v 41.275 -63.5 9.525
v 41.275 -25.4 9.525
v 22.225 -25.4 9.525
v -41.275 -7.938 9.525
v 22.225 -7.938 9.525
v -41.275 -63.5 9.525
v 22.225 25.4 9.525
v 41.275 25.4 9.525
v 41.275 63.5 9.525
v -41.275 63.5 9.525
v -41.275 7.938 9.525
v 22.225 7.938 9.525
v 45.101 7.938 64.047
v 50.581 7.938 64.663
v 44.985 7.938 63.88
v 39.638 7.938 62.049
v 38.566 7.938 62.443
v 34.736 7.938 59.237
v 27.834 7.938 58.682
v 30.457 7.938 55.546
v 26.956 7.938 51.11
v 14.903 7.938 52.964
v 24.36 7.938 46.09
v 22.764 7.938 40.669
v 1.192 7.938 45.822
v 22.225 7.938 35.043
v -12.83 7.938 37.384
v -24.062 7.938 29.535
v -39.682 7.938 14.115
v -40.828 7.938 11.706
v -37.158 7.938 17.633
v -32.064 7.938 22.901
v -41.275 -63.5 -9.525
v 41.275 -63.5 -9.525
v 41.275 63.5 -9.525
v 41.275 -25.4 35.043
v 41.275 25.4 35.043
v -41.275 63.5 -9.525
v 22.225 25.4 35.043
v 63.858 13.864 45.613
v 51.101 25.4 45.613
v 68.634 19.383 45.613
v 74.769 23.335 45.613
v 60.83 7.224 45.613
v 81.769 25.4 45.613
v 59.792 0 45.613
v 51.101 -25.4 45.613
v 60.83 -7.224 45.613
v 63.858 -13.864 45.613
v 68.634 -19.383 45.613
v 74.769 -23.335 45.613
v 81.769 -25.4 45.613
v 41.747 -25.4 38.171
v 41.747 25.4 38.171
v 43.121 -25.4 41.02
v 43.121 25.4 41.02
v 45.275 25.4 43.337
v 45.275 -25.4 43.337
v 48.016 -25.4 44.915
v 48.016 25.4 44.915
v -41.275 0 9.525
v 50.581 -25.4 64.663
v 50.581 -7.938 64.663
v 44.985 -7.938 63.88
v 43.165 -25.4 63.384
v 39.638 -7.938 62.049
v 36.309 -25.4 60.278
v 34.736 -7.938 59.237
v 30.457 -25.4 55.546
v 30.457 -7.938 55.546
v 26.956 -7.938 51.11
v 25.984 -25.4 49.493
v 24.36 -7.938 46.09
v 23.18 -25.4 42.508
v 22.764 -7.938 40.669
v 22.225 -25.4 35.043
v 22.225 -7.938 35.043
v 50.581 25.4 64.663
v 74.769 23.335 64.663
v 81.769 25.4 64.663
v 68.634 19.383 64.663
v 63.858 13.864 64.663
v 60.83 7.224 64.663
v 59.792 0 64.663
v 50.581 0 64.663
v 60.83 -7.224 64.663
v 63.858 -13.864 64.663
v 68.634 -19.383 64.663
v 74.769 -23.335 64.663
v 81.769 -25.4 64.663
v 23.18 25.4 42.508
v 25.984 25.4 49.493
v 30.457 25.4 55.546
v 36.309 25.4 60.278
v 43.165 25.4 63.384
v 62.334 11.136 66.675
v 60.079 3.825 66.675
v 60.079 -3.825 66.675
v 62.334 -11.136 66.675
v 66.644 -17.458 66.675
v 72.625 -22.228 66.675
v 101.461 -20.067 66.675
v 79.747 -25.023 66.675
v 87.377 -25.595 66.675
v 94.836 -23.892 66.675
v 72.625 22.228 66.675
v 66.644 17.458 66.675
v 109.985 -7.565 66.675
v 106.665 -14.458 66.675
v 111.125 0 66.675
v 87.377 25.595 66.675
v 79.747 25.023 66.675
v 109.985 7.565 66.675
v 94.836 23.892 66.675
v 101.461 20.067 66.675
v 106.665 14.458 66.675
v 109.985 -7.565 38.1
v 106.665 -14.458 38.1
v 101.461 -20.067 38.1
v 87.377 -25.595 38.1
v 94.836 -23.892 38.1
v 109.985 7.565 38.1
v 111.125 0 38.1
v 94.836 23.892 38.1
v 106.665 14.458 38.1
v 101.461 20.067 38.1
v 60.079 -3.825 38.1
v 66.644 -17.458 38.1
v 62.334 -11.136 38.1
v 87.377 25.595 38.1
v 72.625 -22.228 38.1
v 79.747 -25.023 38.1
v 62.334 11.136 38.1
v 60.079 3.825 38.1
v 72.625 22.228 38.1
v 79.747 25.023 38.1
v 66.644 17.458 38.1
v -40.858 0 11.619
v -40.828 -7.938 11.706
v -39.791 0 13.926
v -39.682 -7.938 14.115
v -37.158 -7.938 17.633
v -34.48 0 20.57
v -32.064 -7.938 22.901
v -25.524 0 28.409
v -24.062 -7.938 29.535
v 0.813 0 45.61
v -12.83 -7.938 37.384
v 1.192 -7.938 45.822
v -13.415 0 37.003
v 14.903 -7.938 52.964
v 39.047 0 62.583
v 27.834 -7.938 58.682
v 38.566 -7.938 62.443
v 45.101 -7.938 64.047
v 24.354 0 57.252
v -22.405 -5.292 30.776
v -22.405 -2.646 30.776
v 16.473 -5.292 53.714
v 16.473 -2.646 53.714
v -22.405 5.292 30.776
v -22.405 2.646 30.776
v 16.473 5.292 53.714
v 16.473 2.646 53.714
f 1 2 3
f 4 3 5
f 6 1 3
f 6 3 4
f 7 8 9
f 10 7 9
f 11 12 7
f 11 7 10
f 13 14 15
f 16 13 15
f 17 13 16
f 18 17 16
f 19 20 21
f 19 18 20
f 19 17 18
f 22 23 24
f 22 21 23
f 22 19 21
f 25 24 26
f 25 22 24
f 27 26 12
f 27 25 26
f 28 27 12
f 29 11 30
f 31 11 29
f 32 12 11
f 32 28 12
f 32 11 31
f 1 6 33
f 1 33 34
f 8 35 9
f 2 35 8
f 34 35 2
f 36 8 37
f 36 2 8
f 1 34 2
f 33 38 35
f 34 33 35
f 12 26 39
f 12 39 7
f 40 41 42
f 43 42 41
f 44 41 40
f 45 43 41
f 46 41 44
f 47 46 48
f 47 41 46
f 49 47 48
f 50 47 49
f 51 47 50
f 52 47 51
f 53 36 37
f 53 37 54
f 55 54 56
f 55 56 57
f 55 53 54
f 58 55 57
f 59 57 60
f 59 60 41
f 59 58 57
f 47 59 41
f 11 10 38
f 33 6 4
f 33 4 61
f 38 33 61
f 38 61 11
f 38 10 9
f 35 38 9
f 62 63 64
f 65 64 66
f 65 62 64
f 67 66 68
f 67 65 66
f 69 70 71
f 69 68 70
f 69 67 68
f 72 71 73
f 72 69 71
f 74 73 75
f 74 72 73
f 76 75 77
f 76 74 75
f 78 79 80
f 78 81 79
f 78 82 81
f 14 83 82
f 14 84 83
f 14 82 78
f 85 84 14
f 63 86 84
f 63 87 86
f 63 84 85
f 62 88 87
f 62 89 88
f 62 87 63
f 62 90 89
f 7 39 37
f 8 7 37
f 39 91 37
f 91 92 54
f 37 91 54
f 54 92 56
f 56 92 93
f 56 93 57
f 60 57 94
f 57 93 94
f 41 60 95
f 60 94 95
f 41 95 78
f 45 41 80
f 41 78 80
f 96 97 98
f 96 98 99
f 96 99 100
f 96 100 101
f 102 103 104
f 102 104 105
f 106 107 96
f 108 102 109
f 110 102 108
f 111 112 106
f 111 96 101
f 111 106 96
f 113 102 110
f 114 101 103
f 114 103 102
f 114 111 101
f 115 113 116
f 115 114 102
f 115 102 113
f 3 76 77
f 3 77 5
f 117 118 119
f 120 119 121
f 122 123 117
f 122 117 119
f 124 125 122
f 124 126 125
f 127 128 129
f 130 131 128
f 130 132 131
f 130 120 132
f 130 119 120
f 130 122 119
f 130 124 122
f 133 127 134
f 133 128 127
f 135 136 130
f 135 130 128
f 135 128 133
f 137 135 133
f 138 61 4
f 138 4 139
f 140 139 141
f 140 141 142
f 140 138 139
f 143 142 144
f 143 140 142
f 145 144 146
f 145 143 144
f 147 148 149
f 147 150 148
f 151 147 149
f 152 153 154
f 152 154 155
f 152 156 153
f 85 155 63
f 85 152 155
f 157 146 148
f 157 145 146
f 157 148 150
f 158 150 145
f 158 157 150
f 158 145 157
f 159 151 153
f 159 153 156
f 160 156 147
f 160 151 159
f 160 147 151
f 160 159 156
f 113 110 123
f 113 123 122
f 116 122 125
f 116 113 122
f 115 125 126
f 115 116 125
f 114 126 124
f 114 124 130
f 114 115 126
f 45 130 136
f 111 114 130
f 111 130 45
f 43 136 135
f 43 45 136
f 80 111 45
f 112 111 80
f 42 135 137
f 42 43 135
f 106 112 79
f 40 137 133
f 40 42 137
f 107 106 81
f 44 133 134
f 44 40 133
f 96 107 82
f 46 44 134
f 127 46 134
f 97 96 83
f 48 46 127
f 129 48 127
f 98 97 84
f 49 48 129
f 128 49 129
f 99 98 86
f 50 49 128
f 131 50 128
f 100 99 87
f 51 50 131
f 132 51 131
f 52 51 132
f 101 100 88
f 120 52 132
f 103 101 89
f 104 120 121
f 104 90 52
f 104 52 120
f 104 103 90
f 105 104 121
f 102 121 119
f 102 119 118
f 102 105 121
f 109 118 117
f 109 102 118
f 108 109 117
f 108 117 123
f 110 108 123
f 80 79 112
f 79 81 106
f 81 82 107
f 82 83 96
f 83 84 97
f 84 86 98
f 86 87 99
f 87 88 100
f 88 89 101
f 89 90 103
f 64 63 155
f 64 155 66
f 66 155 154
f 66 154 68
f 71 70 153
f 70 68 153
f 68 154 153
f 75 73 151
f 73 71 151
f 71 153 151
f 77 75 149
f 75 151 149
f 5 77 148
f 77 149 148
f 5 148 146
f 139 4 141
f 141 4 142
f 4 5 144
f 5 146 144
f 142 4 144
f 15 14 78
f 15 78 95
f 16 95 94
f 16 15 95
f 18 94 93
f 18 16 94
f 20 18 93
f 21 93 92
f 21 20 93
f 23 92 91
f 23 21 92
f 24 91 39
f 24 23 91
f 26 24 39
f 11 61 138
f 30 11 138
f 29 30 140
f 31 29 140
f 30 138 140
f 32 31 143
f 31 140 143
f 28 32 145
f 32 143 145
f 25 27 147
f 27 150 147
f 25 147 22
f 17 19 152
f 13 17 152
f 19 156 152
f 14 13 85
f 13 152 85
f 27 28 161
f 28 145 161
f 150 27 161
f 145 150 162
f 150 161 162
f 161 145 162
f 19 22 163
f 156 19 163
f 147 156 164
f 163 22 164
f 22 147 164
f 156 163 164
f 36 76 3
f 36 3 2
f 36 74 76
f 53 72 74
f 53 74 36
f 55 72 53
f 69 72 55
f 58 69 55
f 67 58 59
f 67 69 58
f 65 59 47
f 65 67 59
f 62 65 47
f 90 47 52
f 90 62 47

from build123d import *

# Parameters (mm, degrees)
F1_DEPTH = 63.5
F0_W     = 25.1334723711
F0_H     = 19.05
F2_DEPTH = 25.4
F3_DEPTH = 7.9375


with BuildPart() as f1:
    # F0 (on Front) → F1 (new body, symmetric)
    with BuildSketch(Plane.XZ):
        Polygon((-41.275, 9.525), (-41.275, -9.525), (41.275, -9.525), (41.275, 9.525), (22.225, 9.525), align=None)
    extrude(amount=F1_DEPTH, both=True)

    # F0 (on Front) → F2 (join, symmetric)
    with BuildSketch(Plane.XZ):
        with BuildLine():
            Line((22.225, 9.525), (41.275, 9.525))
            Line((41.275, 9.525), (41.275, 35.0430520255))
            ThreePointArc((41.275, 35.0430520255), (44.1109864464, 42.2590514087), (51.101194276, 45.6132220545))
            Line((51.101194276, 45.6132220545), (60.325, 45.6132220545))
            Line((60.325, 45.6132220545), (60.325, 64.6632220545))
            Line((60.325, 64.6632220545), (50.5813328098, 64.6632220545))
            ThreePointArc((50.5813328098, 64.6632220545), (30.4568754428, 55.5457108956), (22.225, 35.0430520255))
            Line((22.225, 35.0430520255), (22.225, 9.525))
        make_face()
        with Locations((72.8917361856, 55.1382220545)):
            Rectangle(F0_W, F0_H)
    extrude(amount=F2_DEPTH, both=True)

    # F0 (on Front) → F3 (join, symmetric)
    with BuildSketch(Plane.XZ):
        with BuildLine():
            add(Edge.make_bspline(
                [(-41.275, 9.525), (-40.6684018672, 25.3735426813), (27.1178521216, 64.2672926188), (50.5813328098, 64.6632220545)],
                knots=[0, 0, 0, 0, 107.134538822, 107.134538822, 107.134538822, 107.134538822], degree=3))
            Line((-41.275, 9.525), (22.225, 9.525))
            Line((22.225, 9.525), (22.225, 35.0430520255))
            ThreePointArc((22.225, 35.0430520255), (30.4568754428, 55.5457108956), (50.5813328098, 64.6632220545))
        make_face()
    extrude(amount=F3_DEPTH, both=True)

    # F0 (on Front) → F4 (revolve)
    with BuildSketch(Plane.XZ):
        Polygon((85.4584723711, 66.675), (85.4584723711, 64.6632220545), (85.4584723711, 45.6132220545), (85.4584723711, 38.1), (111.125, 38.1), (111.125, 66.675), align=None)
    revolve(axis=Axis((85.4584723711, 0, 52.3875), (0, 0, 1)))


solid = f1.part
